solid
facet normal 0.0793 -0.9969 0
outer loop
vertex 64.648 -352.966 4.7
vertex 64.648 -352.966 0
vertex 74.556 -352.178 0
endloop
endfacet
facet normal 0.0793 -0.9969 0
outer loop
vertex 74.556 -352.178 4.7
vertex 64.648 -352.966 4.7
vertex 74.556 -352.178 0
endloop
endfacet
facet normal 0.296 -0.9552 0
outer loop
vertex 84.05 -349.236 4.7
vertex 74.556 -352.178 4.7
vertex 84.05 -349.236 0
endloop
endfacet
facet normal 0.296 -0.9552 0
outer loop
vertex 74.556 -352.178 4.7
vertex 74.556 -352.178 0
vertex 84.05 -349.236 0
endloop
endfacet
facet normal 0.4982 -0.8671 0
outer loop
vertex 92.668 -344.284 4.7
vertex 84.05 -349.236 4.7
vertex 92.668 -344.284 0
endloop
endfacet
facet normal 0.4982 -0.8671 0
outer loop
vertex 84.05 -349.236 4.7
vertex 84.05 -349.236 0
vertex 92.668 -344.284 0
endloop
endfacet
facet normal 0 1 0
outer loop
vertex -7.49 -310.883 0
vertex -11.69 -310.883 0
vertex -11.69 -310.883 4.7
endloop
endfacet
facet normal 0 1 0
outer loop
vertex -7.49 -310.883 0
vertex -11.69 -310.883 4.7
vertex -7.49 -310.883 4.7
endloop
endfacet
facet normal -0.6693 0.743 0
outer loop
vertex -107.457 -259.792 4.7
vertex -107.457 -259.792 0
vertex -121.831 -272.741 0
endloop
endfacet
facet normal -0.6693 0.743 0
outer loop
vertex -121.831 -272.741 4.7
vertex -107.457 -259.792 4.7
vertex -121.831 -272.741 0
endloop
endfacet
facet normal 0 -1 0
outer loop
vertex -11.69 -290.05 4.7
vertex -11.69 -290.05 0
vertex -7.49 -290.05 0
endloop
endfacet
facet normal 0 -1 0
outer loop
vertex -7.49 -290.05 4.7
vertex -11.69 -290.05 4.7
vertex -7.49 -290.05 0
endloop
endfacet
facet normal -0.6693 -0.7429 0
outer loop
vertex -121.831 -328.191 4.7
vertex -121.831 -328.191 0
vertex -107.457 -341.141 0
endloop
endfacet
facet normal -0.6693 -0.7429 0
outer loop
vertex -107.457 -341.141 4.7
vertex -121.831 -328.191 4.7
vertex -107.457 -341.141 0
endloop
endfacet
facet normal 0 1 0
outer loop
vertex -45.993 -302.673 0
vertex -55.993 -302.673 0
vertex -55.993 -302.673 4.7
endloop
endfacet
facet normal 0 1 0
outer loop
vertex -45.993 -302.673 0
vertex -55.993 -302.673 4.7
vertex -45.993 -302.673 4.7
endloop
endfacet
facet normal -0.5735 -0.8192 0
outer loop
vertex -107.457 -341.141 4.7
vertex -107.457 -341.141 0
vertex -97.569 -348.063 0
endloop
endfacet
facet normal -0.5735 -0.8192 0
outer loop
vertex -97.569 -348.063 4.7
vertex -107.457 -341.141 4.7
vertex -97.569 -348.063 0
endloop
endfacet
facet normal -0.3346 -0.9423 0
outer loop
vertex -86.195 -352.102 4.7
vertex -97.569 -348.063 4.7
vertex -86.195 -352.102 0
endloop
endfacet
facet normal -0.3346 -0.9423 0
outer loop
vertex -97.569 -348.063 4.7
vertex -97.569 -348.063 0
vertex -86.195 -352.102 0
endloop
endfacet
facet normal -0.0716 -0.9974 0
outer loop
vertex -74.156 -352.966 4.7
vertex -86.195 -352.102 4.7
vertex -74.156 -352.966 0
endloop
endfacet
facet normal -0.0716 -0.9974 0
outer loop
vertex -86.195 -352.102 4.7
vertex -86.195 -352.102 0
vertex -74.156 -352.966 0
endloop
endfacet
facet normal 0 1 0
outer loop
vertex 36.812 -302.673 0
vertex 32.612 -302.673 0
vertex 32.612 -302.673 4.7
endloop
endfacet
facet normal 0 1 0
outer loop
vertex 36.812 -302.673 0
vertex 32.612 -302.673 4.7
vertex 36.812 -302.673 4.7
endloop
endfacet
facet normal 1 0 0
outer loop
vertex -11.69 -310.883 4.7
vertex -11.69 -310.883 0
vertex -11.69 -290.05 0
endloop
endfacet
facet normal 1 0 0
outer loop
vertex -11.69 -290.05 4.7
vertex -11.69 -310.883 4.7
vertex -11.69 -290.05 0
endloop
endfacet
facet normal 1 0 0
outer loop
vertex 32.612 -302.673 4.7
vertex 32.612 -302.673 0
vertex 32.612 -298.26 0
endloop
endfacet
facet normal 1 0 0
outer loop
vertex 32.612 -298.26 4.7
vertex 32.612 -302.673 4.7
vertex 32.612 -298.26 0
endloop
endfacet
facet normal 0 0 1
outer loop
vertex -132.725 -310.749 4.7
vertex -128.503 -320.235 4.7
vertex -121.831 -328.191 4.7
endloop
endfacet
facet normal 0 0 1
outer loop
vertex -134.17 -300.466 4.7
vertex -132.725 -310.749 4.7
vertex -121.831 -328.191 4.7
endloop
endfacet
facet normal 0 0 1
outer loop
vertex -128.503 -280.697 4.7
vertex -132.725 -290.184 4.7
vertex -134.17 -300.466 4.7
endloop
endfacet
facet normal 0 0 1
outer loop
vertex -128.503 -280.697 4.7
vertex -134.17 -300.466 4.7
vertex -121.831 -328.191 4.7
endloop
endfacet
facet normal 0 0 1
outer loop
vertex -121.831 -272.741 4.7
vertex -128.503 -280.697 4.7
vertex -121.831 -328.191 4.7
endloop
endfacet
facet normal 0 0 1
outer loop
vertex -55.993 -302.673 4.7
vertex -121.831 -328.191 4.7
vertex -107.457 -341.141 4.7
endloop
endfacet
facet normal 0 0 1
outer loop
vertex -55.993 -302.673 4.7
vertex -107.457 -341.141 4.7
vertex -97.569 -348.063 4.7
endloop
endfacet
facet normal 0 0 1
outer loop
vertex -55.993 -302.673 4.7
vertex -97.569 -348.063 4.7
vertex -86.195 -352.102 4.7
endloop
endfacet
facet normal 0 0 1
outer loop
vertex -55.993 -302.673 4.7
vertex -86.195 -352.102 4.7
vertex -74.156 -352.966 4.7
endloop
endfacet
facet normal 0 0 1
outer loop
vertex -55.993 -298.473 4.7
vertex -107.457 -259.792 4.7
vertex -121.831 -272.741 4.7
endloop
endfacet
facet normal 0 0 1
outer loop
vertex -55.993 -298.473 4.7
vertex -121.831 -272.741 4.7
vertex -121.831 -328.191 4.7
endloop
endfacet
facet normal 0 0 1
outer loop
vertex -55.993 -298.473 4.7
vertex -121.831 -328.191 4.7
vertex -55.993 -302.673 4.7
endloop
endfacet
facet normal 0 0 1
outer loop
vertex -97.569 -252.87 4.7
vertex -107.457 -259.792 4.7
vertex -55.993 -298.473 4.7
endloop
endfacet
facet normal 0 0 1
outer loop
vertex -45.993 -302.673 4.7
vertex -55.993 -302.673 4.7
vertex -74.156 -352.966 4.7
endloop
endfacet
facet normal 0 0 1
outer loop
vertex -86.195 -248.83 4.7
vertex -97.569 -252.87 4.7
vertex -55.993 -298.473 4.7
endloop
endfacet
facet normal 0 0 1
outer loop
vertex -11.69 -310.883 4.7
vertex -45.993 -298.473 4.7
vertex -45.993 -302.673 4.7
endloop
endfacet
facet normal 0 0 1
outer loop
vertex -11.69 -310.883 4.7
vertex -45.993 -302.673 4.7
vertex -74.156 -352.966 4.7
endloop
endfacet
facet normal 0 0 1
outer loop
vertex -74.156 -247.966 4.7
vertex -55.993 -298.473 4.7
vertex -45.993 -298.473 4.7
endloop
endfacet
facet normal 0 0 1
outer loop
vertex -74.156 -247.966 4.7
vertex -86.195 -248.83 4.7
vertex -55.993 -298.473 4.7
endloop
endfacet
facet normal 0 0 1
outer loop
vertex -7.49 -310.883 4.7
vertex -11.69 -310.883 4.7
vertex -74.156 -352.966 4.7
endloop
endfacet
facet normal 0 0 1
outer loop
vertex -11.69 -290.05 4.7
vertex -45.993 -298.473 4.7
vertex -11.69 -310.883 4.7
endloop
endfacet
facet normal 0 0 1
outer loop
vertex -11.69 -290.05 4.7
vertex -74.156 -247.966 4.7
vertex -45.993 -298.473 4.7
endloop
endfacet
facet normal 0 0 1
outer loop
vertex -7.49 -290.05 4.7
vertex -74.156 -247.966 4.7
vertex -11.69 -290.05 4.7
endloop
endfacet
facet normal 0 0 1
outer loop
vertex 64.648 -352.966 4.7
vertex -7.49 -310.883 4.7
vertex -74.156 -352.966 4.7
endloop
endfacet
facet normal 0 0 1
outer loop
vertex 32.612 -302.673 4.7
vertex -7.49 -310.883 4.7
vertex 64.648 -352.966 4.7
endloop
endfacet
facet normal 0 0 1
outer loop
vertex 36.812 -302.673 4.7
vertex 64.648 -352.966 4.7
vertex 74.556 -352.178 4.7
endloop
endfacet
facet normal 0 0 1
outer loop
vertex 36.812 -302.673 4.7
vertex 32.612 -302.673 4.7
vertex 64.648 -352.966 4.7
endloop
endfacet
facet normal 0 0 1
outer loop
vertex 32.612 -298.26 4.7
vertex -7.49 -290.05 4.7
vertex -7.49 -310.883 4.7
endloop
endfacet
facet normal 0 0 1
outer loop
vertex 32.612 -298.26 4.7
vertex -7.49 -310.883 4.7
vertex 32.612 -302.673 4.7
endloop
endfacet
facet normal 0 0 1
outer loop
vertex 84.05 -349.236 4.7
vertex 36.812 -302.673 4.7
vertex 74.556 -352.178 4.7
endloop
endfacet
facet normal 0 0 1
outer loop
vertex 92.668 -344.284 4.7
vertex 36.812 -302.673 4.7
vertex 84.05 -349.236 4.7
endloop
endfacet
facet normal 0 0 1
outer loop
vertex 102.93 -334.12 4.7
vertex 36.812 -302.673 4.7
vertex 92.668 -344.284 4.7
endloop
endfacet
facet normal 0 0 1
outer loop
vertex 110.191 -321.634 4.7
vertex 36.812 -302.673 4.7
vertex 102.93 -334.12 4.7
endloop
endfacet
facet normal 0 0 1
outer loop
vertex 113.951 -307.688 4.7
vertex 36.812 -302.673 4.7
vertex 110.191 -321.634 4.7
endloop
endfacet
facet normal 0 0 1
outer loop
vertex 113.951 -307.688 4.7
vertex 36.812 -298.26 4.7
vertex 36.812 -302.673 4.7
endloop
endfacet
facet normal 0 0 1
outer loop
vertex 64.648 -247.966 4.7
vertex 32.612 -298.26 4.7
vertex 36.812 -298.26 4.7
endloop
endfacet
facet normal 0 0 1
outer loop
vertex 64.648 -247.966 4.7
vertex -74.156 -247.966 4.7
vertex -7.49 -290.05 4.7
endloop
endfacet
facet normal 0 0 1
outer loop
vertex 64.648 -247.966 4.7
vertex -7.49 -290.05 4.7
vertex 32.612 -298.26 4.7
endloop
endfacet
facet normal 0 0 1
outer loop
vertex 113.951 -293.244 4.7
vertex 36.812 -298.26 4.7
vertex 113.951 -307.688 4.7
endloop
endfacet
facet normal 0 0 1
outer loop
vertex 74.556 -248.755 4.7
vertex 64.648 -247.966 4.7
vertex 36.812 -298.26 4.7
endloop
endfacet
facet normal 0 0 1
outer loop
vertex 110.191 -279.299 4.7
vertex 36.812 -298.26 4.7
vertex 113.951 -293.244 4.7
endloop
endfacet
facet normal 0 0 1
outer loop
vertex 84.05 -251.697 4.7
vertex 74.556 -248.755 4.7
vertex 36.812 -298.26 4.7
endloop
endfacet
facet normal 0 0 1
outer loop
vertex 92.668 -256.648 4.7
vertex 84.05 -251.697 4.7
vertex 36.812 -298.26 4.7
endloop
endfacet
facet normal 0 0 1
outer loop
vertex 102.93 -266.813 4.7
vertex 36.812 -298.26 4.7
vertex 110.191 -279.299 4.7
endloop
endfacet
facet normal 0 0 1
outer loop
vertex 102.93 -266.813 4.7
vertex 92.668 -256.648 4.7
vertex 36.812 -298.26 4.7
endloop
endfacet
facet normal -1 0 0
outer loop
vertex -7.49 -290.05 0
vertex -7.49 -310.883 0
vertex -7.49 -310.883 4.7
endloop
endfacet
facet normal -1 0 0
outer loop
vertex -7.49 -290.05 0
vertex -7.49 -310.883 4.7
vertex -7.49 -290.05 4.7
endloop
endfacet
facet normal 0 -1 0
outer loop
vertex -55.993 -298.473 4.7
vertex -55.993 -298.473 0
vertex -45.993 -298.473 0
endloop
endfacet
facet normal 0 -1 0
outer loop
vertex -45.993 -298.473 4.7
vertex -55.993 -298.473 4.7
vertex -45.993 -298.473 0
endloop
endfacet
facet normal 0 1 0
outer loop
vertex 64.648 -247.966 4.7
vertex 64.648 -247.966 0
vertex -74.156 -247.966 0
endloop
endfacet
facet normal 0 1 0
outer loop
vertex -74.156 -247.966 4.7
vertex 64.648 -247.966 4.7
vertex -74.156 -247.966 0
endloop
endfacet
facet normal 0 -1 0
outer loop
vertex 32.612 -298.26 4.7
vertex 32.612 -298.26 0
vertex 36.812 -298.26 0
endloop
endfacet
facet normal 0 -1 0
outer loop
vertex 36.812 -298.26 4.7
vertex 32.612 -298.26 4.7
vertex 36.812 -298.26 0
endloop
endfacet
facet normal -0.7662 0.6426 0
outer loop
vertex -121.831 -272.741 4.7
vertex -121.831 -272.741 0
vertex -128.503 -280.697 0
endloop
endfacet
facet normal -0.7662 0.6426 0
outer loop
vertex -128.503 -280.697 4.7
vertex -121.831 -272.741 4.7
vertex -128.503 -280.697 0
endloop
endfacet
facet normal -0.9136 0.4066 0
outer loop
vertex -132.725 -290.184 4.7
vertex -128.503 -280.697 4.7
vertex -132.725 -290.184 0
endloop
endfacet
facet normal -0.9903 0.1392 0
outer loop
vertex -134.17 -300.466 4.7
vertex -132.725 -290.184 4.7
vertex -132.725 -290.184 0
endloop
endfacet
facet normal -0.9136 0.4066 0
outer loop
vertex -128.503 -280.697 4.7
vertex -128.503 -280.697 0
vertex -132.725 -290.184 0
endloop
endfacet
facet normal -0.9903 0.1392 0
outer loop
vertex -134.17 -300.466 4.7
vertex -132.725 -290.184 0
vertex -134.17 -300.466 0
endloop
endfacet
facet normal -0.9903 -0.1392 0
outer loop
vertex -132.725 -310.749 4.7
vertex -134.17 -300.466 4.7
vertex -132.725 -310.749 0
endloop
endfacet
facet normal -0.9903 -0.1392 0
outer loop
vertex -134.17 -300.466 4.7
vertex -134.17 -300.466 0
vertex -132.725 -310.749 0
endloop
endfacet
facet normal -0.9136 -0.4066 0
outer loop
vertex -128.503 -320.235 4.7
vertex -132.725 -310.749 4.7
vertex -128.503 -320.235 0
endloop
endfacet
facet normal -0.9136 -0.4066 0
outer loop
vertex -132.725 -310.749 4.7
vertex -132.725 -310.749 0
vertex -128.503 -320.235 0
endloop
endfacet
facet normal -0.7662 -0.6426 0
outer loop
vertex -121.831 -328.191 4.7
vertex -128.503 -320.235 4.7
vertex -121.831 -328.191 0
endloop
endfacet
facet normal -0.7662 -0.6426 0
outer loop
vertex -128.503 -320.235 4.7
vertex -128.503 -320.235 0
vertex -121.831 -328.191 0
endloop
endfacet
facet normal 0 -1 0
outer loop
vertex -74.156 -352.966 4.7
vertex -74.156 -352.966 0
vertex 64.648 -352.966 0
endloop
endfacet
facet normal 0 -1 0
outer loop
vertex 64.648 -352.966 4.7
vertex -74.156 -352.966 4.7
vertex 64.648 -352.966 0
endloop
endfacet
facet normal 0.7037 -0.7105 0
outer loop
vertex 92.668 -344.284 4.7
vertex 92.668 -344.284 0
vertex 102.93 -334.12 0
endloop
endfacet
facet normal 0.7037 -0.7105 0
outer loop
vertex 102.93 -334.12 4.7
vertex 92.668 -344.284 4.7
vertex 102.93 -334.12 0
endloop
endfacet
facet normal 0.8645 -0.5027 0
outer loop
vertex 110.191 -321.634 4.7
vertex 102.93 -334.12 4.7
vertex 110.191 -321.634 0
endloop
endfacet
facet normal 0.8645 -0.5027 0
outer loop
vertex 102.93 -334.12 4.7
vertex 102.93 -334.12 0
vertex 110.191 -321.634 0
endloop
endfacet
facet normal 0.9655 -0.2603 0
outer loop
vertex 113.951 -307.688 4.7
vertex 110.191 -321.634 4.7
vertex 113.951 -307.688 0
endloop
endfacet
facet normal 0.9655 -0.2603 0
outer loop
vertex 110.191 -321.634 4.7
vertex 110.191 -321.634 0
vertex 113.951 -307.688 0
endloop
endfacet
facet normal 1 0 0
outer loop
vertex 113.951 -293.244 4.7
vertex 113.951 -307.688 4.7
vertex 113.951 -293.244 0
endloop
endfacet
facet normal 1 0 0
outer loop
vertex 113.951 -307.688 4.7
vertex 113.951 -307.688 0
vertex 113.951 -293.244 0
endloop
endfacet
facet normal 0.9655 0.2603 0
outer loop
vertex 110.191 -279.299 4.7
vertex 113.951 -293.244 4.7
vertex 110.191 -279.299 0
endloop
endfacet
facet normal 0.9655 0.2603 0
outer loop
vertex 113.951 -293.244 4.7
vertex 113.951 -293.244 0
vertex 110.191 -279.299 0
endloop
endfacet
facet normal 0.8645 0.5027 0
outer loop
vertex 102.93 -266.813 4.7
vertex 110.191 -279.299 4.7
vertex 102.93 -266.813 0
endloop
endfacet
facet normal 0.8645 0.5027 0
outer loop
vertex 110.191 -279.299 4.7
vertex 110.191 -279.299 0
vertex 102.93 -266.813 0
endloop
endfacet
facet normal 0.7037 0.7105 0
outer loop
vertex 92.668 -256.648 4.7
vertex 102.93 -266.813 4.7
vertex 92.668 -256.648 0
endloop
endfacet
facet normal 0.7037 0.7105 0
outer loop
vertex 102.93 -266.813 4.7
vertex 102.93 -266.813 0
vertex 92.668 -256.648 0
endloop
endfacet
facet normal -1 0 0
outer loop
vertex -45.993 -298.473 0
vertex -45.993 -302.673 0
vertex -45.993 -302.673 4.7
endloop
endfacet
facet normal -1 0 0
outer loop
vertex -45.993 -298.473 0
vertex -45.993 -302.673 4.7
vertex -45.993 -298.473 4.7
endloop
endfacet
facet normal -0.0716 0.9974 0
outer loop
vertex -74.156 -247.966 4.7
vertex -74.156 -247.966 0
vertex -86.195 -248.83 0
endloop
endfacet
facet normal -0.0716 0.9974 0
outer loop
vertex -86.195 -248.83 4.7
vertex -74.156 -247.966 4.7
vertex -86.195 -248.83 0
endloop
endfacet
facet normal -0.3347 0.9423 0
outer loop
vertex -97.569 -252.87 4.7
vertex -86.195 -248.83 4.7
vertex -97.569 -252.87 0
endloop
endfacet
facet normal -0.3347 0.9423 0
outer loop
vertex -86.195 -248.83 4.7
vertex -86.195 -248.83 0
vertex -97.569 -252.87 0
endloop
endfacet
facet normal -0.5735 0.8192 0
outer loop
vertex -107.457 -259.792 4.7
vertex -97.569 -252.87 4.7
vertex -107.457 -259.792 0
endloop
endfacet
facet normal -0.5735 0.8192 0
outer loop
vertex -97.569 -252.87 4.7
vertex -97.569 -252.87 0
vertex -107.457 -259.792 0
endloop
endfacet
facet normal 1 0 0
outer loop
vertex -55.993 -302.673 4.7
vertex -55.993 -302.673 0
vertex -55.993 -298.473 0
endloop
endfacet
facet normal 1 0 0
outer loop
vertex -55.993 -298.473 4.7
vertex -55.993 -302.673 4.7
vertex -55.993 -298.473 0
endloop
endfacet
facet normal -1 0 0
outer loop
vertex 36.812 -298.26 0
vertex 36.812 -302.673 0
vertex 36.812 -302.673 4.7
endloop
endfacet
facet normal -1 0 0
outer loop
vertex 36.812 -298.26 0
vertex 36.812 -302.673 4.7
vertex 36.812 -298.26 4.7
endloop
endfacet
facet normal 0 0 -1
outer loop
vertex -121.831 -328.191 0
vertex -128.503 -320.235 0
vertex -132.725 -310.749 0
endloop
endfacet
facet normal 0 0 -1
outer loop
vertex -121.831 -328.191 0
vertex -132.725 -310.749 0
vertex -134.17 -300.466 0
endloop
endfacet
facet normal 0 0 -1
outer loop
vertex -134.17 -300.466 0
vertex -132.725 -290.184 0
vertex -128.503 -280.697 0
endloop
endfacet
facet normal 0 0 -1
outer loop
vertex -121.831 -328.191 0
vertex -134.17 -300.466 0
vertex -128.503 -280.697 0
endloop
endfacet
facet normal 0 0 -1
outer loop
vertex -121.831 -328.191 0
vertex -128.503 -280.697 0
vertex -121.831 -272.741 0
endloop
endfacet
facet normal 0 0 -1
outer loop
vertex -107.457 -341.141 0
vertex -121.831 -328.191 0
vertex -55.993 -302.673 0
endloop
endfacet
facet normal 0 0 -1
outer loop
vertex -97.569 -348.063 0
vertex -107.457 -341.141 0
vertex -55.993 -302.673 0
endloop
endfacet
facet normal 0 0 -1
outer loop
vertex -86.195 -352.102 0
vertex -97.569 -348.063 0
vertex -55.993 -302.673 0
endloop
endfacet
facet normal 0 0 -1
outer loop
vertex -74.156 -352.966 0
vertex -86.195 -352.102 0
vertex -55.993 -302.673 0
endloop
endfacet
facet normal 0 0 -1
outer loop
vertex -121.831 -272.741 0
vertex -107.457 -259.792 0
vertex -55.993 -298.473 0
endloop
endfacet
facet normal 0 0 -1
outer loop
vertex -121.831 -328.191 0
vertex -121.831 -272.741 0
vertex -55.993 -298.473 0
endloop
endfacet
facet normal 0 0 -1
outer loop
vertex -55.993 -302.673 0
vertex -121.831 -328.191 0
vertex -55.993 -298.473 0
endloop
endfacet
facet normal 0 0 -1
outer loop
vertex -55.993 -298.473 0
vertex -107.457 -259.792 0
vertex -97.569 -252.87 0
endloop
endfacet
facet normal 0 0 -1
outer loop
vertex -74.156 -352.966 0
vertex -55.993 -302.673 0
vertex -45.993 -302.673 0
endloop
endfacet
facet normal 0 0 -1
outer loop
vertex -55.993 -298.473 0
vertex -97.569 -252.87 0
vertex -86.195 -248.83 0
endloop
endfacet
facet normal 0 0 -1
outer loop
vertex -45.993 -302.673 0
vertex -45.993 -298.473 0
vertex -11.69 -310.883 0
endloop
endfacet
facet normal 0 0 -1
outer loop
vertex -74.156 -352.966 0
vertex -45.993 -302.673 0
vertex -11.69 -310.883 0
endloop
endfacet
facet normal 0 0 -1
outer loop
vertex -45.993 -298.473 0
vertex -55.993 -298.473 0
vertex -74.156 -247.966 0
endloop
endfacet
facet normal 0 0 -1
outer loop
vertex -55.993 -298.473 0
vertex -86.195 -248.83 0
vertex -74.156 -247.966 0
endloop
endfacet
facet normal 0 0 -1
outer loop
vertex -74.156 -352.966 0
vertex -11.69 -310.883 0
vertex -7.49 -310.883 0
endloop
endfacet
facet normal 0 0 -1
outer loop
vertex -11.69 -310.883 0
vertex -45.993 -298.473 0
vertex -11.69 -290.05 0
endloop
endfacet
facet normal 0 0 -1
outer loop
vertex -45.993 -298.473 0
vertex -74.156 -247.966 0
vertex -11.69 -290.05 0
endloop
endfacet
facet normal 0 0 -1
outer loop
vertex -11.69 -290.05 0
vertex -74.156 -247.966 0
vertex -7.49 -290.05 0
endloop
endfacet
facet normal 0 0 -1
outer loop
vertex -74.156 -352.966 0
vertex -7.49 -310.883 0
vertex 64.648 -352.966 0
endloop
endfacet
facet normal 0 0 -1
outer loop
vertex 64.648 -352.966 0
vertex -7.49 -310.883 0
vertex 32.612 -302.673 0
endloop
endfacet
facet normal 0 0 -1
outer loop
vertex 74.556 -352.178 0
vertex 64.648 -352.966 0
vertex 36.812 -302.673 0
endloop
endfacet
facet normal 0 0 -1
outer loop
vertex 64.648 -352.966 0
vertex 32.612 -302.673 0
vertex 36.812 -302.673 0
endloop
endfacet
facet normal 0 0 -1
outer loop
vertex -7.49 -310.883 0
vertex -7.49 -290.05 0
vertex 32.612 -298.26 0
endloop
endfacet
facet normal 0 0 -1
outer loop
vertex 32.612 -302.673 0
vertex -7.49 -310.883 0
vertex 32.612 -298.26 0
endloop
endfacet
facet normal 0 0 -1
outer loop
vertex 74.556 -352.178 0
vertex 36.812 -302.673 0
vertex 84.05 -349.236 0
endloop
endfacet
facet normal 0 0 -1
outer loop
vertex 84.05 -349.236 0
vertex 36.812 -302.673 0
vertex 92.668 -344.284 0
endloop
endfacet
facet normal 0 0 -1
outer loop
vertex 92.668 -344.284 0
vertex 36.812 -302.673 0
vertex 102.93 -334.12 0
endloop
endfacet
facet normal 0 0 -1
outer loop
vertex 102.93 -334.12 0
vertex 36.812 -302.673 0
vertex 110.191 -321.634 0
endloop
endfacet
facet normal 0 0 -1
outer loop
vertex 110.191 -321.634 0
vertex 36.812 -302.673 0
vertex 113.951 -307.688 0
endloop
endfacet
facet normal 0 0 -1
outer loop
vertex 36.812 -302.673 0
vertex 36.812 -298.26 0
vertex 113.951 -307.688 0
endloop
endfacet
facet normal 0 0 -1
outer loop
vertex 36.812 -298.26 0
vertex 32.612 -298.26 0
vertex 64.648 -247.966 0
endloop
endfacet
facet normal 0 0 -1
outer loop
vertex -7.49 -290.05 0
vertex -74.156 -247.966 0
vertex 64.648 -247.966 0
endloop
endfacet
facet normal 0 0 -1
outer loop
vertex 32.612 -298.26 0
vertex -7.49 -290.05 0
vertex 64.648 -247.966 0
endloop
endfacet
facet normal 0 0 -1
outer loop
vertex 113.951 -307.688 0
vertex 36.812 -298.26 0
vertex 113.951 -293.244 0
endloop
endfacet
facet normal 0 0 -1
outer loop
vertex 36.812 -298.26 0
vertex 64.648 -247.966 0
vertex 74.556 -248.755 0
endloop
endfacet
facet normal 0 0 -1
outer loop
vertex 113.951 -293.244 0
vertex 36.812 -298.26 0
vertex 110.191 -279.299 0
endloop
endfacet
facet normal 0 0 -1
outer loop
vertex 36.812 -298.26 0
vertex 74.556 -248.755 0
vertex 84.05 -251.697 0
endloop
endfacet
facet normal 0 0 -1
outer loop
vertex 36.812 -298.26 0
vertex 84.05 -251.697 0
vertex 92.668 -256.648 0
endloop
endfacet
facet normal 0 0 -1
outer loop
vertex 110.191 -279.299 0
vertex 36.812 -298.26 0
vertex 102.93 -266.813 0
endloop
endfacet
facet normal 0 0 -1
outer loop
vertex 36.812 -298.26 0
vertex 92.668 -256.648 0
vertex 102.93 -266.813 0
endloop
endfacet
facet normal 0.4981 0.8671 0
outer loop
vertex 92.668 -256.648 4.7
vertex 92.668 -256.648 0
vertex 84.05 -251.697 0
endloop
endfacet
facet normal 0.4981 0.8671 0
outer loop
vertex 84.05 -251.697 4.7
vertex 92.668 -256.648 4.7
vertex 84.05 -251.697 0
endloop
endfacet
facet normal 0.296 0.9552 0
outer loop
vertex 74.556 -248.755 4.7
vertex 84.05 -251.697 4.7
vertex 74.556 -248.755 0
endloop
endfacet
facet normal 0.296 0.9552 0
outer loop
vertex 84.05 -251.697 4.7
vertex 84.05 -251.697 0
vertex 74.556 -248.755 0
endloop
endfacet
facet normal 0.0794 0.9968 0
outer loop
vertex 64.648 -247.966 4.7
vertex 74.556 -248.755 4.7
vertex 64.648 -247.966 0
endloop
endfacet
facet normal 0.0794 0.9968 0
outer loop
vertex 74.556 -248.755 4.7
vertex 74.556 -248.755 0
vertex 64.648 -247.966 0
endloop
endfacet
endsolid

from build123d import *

# Parameters (mm, degrees)
F0_W     = 10
F0_H     = 4.2
F0_W_2   = 4.2
F0_H_2   = 4.413
F0_H_3   = 20.833439
F1_DEPTH = 4.7


with BuildPart() as f1:
    # F0 (on Top) → F1 (new body)
    with BuildSketch(Plane.XY):
        with BuildLine():
            Line((64.647796, -247.966312), (-74.155779, -247.966312))
            ThreePointArc((-74.155779, -247.966312), (-92.018545, -250.466108), (-107.45737, -259.791883))
            Line((-107.45737, -259.791883), (-121.830828, -272.74143))
            ThreePointArc((-121.830828, -272.74143), (-134.169875, -300.46631), (-121.830828, -328.191191))
            Line((-121.830828, -328.191191), (-107.45737, -341.140737))
            ThreePointArc((-107.45737, -341.140737), (-92.018545, -350.466513), (-74.155779, -352.966309))
            Line((-74.155779, -352.966309), (64.647796, -352.966309))
            ThreePointArc((64.647796, -352.966309), (79.384336, -350.969442), (92.668302, -344.284436))
            ThreePointArc((92.668302, -344.284436), (114.427186, -300.46631), (92.668302, -256.648185))
            ThreePointArc((92.668302, -256.648185), (79.384336, -249.963178), (64.647796, -247.966312))
        make_face()
        with Locations((-50.99257, -300.572956)):
            Rectangle(F0_W, F0_H, mode=Mode.SUBTRACT)
        with Locations((34.711947, -300.466456)):
            Rectangle(F0_W_2, F0_H_2, mode=Mode.SUBTRACT)
        with Locations((-9.590311, -300.46631)):
            Rectangle(F0_W_2, F0_H_3, mode=Mode.SUBTRACT)
    extrude(amount=F1_DEPTH)


solid = f1.part
